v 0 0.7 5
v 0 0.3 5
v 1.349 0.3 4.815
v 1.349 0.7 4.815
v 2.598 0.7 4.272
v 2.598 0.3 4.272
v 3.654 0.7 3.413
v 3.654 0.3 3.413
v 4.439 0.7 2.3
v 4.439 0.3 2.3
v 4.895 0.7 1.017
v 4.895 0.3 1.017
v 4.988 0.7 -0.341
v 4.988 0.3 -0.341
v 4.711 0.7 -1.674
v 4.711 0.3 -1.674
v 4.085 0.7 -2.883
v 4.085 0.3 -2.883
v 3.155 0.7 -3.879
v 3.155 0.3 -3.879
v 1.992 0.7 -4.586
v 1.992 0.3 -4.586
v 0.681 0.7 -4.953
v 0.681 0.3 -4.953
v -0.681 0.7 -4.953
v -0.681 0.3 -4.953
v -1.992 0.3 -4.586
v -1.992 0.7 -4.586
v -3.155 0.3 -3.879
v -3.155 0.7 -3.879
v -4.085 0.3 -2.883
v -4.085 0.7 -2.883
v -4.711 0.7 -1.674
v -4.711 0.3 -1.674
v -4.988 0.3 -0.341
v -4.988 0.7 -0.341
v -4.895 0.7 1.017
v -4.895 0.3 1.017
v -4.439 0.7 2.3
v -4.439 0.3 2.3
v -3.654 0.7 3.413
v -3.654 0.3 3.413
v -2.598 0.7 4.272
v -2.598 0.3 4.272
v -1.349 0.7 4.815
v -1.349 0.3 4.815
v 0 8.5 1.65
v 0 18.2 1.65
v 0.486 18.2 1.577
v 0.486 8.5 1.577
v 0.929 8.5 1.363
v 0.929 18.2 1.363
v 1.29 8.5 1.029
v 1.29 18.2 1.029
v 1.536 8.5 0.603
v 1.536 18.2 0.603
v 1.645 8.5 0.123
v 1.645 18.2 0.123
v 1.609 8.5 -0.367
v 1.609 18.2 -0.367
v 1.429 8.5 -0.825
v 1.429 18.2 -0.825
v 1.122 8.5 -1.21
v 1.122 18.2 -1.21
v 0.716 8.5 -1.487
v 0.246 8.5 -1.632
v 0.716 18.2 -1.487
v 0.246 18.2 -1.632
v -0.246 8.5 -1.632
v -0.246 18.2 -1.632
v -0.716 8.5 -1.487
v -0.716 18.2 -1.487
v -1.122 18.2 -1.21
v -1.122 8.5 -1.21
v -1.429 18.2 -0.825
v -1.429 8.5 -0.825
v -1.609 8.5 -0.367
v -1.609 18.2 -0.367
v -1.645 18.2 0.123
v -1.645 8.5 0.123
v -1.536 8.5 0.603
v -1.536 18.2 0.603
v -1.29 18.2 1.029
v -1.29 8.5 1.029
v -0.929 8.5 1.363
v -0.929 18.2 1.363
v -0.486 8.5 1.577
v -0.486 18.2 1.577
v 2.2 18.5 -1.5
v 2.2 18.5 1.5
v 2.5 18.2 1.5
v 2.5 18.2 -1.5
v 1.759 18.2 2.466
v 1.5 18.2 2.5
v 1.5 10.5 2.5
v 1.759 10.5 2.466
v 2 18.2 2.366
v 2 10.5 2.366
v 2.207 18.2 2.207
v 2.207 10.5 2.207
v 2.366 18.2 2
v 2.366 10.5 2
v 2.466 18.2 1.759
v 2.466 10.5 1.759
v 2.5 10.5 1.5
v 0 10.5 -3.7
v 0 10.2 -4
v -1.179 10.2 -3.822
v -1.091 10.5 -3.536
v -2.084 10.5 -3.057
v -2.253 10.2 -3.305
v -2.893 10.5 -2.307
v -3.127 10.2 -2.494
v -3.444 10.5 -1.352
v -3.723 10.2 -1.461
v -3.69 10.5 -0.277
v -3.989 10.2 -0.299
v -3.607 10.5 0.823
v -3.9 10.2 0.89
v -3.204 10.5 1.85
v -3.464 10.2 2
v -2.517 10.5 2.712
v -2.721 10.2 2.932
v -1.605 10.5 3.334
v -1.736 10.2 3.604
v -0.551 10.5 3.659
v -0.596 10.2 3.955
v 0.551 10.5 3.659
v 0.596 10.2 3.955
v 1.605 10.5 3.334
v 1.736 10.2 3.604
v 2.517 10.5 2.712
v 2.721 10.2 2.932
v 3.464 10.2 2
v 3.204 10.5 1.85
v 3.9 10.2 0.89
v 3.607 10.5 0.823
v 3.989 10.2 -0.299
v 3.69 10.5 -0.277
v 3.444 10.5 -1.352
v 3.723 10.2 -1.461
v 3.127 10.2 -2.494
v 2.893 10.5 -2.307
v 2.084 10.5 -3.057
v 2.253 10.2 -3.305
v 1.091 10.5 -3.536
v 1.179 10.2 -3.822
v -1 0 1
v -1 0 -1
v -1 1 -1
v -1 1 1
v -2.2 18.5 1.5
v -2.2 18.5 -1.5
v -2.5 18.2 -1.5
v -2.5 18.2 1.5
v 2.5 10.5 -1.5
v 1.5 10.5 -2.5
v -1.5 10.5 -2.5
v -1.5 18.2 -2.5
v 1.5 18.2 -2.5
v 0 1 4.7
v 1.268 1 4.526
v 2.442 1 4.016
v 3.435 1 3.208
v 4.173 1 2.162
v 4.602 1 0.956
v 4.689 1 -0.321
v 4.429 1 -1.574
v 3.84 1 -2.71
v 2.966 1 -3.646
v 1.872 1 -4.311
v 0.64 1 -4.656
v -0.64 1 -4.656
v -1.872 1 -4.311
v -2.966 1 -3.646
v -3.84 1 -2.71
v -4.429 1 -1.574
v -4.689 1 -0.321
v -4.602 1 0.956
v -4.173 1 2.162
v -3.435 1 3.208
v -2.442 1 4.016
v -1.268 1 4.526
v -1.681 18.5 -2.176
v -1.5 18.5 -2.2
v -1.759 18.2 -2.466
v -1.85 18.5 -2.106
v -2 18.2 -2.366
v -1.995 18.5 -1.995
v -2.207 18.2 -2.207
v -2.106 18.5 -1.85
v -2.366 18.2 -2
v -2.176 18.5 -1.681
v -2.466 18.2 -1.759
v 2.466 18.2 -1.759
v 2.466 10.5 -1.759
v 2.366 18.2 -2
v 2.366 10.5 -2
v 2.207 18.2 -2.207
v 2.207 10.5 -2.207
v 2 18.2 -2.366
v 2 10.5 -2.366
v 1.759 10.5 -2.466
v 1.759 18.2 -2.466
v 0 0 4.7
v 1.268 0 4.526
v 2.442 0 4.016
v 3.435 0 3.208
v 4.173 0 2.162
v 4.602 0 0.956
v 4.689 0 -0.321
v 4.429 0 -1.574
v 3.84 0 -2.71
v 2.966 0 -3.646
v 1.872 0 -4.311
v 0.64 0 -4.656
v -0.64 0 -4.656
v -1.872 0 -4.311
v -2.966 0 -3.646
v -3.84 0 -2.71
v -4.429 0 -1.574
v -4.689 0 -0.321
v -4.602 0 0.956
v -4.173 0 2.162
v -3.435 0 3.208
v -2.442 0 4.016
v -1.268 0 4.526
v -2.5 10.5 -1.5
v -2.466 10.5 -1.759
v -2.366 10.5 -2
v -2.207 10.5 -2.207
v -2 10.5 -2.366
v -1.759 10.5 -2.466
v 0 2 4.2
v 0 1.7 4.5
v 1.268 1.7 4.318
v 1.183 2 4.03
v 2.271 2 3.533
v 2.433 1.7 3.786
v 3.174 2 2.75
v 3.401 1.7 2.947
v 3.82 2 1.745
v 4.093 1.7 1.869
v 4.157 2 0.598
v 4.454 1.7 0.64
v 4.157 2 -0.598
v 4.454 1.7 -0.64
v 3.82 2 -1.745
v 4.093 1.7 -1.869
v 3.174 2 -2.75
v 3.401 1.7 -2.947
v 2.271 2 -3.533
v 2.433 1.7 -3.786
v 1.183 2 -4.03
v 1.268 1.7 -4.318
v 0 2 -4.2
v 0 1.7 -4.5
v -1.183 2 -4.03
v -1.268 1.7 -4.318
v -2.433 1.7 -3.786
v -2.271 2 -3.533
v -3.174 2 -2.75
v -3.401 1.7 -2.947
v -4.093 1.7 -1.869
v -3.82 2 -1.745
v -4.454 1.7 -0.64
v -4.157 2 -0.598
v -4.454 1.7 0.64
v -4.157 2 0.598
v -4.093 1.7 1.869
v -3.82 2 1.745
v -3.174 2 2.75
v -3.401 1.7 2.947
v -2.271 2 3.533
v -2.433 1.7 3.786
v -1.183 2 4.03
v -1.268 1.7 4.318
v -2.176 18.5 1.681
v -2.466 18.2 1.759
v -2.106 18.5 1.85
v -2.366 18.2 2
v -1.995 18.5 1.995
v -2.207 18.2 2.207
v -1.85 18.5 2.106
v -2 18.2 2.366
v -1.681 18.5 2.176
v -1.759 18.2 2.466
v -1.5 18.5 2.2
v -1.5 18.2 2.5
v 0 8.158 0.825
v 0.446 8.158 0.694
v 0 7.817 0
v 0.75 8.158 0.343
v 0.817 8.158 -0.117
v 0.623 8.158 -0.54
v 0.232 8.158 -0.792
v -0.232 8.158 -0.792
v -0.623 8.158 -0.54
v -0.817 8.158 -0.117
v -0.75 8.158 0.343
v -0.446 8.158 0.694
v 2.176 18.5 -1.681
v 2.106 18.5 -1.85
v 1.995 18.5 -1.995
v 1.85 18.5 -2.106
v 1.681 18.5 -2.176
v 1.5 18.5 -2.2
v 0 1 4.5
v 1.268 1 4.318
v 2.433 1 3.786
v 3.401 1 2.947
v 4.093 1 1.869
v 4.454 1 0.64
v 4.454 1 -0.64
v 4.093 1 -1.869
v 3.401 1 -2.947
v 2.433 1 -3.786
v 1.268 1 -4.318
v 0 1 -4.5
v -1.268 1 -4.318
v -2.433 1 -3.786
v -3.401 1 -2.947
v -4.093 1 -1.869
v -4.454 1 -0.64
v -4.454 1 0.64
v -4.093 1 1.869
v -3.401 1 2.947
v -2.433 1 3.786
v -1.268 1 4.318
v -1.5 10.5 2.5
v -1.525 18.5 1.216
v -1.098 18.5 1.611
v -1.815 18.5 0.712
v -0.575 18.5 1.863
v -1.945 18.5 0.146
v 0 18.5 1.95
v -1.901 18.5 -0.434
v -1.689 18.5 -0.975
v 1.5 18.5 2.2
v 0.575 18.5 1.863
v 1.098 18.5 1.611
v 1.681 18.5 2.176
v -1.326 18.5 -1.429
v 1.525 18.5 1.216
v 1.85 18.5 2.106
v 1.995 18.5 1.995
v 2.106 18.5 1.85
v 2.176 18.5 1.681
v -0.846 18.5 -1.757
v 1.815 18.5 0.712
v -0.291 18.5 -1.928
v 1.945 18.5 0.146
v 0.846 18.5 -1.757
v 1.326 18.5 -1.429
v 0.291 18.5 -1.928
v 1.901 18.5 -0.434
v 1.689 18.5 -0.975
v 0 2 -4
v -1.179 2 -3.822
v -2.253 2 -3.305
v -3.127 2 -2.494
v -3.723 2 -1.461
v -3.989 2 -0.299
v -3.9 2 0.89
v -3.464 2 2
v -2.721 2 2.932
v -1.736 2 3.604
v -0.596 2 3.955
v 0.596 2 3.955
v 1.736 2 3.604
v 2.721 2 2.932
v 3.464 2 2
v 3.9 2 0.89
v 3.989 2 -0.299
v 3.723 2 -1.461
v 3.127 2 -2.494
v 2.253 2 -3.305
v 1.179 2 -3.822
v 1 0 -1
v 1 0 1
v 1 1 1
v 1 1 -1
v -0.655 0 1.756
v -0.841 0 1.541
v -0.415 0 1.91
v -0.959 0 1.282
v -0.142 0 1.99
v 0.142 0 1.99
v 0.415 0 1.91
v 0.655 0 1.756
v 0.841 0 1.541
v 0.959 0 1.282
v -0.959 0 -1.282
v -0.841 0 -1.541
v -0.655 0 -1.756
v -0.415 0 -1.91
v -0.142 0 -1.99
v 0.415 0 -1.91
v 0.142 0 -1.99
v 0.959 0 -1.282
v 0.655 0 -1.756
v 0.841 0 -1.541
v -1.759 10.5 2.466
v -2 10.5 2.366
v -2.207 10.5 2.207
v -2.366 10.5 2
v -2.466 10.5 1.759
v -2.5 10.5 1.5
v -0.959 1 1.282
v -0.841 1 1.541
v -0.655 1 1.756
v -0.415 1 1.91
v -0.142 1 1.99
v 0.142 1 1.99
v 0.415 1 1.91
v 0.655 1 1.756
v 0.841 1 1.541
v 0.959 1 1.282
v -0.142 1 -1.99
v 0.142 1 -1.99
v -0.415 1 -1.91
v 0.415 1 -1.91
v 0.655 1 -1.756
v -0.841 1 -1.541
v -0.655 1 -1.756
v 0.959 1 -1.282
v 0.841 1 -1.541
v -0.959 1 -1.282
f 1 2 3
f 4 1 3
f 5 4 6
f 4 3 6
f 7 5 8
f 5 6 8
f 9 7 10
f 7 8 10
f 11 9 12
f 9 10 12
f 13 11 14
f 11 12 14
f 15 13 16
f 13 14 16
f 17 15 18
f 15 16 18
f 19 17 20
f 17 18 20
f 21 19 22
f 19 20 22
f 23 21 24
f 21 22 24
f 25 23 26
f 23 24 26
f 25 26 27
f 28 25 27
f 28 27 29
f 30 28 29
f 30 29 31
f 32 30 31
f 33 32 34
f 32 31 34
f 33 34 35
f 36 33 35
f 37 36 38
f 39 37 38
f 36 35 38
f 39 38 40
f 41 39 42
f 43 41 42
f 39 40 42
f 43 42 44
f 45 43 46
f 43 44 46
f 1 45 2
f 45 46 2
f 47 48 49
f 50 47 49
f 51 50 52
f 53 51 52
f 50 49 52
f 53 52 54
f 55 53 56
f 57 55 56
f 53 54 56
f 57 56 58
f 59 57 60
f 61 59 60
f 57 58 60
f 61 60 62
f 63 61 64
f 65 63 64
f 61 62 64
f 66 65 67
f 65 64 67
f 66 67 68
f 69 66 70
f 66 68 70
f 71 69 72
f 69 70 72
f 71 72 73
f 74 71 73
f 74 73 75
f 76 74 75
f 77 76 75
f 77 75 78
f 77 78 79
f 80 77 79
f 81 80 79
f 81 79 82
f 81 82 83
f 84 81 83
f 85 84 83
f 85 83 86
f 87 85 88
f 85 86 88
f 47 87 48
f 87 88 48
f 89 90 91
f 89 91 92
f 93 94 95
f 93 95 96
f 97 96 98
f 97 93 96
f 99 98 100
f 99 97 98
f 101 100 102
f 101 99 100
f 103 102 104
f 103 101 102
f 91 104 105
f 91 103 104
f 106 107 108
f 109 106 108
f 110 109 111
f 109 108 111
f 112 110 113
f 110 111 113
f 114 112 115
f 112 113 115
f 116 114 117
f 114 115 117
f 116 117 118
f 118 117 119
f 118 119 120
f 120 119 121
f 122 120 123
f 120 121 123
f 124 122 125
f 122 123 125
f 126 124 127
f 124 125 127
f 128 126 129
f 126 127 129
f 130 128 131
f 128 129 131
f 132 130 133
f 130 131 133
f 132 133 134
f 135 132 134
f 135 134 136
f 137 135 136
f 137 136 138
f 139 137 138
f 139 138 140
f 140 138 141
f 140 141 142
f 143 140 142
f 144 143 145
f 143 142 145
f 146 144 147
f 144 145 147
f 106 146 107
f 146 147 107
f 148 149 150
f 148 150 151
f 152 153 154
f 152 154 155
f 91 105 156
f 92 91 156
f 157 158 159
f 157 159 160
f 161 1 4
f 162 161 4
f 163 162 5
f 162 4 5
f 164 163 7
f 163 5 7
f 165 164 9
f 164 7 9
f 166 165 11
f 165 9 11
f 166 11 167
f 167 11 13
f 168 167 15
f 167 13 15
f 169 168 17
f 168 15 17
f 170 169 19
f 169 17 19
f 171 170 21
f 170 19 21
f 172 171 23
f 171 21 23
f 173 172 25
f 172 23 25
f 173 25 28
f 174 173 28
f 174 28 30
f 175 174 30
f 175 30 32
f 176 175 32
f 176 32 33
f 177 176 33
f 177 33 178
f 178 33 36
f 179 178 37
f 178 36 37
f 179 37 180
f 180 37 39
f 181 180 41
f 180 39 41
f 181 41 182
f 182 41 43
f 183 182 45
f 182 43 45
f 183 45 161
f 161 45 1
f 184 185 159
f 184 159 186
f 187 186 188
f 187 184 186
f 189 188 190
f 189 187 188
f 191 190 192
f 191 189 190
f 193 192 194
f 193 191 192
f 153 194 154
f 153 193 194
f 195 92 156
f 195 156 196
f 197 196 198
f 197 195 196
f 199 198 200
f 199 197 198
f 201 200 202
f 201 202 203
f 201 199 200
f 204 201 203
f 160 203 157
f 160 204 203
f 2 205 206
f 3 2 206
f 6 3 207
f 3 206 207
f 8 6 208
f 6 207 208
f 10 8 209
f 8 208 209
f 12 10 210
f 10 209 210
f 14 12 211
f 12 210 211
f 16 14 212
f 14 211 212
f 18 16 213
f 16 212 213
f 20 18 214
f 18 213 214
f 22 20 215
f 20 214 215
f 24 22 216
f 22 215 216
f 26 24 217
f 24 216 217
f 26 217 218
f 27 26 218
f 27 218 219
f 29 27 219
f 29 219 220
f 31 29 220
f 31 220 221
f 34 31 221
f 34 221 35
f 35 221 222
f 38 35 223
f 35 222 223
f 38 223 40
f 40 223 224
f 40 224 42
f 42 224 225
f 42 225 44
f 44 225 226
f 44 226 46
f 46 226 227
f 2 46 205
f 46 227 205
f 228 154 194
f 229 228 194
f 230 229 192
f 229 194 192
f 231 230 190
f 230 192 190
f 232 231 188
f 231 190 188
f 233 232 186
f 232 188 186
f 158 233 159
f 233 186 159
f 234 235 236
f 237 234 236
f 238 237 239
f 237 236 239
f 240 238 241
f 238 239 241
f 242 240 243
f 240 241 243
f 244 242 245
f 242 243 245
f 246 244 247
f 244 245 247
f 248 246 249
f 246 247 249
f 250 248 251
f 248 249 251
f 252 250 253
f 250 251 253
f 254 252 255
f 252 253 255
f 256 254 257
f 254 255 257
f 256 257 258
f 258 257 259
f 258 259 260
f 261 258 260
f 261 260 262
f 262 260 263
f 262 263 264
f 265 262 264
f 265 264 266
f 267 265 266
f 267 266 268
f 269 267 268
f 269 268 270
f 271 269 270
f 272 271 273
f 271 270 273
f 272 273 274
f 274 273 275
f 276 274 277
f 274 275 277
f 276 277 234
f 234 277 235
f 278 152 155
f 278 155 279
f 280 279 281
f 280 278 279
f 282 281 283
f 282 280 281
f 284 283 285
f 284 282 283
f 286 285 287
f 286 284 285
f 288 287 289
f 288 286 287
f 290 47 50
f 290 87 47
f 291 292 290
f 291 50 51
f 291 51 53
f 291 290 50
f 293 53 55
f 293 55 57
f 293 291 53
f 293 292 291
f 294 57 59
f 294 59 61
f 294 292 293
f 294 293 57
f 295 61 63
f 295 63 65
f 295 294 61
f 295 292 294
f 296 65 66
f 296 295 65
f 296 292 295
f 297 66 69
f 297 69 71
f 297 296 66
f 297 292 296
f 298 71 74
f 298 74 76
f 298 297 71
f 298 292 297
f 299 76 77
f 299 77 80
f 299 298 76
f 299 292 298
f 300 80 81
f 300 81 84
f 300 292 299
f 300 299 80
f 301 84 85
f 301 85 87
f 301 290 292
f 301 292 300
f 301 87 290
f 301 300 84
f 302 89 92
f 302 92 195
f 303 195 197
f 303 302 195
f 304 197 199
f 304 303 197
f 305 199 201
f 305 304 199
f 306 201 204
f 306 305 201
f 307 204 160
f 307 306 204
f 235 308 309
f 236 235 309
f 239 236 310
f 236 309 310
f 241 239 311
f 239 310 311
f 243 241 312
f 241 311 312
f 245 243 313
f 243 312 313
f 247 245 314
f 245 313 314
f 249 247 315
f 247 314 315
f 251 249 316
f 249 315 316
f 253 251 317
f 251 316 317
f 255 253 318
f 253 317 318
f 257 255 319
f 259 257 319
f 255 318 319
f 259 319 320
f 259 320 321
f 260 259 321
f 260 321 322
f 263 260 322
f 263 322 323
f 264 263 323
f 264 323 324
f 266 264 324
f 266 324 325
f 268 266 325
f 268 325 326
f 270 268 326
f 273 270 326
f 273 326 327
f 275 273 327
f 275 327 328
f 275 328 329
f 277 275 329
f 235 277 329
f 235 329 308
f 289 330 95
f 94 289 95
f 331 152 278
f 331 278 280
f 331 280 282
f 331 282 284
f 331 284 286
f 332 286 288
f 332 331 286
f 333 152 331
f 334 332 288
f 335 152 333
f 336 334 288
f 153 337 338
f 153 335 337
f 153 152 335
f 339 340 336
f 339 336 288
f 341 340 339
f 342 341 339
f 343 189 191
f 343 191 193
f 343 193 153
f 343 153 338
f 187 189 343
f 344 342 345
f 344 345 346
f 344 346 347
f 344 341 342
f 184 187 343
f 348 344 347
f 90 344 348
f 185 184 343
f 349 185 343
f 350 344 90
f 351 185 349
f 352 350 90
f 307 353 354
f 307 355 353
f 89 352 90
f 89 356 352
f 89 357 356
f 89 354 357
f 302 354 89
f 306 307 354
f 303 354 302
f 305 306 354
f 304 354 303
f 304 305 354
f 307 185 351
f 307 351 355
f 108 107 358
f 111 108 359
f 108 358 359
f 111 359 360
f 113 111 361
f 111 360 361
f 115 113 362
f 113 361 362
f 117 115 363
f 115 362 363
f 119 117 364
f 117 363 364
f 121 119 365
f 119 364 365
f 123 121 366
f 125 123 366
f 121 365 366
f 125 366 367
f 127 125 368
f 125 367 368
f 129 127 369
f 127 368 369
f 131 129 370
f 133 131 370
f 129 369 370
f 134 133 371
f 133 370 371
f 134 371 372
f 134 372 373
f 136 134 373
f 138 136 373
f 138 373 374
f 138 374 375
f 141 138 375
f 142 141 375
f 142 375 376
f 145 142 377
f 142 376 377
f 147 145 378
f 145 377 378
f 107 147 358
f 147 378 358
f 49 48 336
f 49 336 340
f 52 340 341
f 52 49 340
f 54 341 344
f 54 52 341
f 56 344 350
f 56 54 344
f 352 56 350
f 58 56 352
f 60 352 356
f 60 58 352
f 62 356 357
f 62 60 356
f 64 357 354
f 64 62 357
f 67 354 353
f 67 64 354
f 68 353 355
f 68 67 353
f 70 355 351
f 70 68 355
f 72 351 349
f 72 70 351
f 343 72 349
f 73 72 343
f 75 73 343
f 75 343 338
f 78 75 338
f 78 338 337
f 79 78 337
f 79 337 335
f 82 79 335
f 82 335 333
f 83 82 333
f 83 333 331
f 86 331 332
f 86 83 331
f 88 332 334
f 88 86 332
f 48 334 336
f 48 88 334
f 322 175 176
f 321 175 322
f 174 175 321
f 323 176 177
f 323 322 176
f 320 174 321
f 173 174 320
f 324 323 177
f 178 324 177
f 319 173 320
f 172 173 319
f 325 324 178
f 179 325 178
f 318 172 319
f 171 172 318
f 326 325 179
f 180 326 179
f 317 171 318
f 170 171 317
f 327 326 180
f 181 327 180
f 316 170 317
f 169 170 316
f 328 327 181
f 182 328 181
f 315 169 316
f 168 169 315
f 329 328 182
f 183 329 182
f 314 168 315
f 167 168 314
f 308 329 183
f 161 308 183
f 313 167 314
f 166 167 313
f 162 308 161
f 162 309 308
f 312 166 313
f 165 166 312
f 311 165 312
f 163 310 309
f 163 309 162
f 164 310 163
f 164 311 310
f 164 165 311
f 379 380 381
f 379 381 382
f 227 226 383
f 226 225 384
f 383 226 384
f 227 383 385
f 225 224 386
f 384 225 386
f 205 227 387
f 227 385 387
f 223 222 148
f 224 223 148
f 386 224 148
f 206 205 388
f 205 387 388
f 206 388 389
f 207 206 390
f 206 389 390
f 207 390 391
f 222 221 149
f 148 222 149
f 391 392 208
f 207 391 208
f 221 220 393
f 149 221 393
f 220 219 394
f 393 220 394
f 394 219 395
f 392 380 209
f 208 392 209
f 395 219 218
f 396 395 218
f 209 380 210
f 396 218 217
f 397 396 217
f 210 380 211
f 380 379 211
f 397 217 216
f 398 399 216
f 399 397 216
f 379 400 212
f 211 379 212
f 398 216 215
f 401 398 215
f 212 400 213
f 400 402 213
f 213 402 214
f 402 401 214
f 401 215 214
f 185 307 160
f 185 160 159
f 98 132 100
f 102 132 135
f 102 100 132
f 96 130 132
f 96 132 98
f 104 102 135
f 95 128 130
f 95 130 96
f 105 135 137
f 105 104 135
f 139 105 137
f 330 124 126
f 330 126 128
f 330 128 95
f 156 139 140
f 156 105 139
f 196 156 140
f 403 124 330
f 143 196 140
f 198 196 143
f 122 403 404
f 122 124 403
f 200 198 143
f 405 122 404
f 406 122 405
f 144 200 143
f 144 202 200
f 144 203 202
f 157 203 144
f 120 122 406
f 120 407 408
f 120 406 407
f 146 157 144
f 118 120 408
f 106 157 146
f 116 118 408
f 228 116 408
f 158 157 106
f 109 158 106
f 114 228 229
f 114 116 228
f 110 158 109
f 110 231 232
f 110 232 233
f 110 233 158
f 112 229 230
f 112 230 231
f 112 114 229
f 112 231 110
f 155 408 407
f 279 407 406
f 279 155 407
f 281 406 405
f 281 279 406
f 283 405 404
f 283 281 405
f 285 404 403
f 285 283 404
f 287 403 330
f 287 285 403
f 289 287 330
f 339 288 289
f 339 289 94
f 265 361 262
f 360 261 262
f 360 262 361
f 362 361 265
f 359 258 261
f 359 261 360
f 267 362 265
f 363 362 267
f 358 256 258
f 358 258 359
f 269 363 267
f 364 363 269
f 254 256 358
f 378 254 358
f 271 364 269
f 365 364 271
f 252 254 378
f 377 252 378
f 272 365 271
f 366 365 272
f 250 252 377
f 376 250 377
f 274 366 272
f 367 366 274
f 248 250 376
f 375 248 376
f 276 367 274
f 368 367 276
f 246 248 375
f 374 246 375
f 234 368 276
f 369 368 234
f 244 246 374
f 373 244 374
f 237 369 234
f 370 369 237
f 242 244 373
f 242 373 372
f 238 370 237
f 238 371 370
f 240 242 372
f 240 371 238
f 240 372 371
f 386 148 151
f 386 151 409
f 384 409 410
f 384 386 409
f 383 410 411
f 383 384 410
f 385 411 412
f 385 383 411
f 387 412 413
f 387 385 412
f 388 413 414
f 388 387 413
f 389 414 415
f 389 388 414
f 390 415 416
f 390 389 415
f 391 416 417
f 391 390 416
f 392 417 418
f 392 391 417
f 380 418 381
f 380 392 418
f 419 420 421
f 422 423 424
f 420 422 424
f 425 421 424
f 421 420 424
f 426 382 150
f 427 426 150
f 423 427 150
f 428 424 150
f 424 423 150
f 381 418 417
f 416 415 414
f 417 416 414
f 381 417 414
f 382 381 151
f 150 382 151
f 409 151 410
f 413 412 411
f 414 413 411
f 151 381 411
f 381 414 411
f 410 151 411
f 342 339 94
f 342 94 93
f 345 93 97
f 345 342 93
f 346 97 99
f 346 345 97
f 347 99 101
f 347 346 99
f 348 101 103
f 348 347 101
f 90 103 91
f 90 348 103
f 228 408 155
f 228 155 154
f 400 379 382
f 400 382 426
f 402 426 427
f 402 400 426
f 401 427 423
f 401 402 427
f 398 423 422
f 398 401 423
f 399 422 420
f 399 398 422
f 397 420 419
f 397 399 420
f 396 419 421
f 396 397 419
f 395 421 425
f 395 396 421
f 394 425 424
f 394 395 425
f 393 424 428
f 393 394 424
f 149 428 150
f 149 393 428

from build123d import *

# Parameters (mm, degrees)
SKETCH_1_R          = 5
SKETCH_1_R_2        = 4.5
EXTRUDE_1_DEPTH     = 1
SKETCH_1_5_R        = 4.5
SKETCH_1_5_R_2      = 4
EXTRUDE_2_DEPTH     = 2
SKETCH_1_6_R        = 4
EXTRUDE_3_DEPTH     = 10.5
SKETCH_1_7_W        = 5
SKETCH_1_7_H        = 5
EXTRUDE_4_DEPTH     = 18.5
CUT_EXTRUDE_1_DEPTH = 1
SKETCH_5_R          = 1.65
CUT_EXTRUDE_2_DEPTH = 10
FILLET_1_R          = 1
CHAMFER_1_SIZE      = 0.3


with BuildPart() as part:
    # 스케치1 → 보스-돌출1 (new body)
    with BuildSketch(Plane(origin=(0, 0, 0), x_dir=(1, 0, 0), z_dir=(0, 1, 0))):
        Circle(SKETCH_1_R)
        Circle(SKETCH_1_R_2, mode=Mode.SUBTRACT)
    extrude(amount=EXTRUDE_1_DEPTH)

    # 스케치1<5> → 보스-돌출2 (add)
    with BuildSketch(Plane(origin=(0, 0, 0), x_dir=(1, 0, 0), z_dir=(0, 1, 0))):
        Circle(SKETCH_1_5_R)
        Circle(SKETCH_1_5_R_2, mode=Mode.SUBTRACT)
    extrude(amount=EXTRUDE_2_DEPTH)

    # 스케치1<6> → 보스-돌출3 (add)
    with BuildSketch(Plane(origin=(0, 0, 0), x_dir=(1, 0, 0), z_dir=(0, 1, 0))):
        Circle(SKETCH_1_6_R)
    extrude(amount=EXTRUDE_3_DEPTH)

    # 스케치1<7> → 보스-돌출4 (add)
    with BuildSketch(Plane(origin=(0, 0, 0), x_dir=(1, 0, 0), z_dir=(0, 1, 0))):
        Rectangle(SKETCH_1_7_W, SKETCH_1_7_H)
    extrude(amount=EXTRUDE_4_DEPTH)

    # 스케치3 → 컷-돌출1 (cut)
    with BuildSketch(Plane.XZ):
        with BuildLine():
            Line((1, 1), (1, -1))
            ThreePointArc((1, -1), (0, -2), (-1, -1))
            Line((-1, -1), (-1, 1))
            ThreePointArc((-1, 1), (0, 2), (1, 1))
        make_face()
    extrude(amount=-CUT_EXTRUDE_1_DEPTH, mode=Mode.SUBTRACT)

    # 스케치4 → 컷-회전1 (revolve, cut)
    with BuildSketch(Plane.XY):
        Polygon((0, 8.5), (-1.65, 8.5), (0, 7.816547622), align=None)
    revolve(axis=Axis((0, -0.586194708, 0), (0, 1, 0)), mode=Mode.SUBTRACT)

    # 스케치5 → 컷-돌출2 (cut)
    with BuildSketch(Plane(origin=(0, 18.5, 0), x_dir=(1, 0, 0), z_dir=(0, 1, 0))):
        Circle(SKETCH_5_R)
    extrude(amount=-CUT_EXTRUDE_2_DEPTH, mode=Mode.SUBTRACT)

    # 필렛1
    fillet_1_edges = [part.edges().sort_by_distance(p)[0] for p in [
        (2.5, 14.5, 2.5),
        (2.5, 14.5, -2.5),
        (-2.5, 14.5, 2.5),
        (-2.5, 14.5, -2.5),
    ]]
    fillet(fillet_1_edges, radius=FILLET_1_R)

    # 모따기1
    chamfer_1_edges = [part.edges().sort_by_distance(p)[0] for p in [
        (-1.65, 18.5, 0),
        (-5, 0, 0),
        (-5, 1, 0),
        (-4.5, 2, 0),
        (-4, 10.5, 0),
        (2.5, 18.5, 0),
        (0, 18.5, -2.5),
        (-2.5, 18.5, 0),
        (0, 18.5, 2.5),
        (2.207106781, 18.5, 2.207106781),
        (-2.207106781, 18.5, 2.207106781),
        (2.207106781, 18.5, -2.207106781),
        (-2.207106781, 18.5, -2.207106781),
    ]]
    chamfer(chamfer_1_edges, length=CHAMFER_1_SIZE)


solid = part.part
